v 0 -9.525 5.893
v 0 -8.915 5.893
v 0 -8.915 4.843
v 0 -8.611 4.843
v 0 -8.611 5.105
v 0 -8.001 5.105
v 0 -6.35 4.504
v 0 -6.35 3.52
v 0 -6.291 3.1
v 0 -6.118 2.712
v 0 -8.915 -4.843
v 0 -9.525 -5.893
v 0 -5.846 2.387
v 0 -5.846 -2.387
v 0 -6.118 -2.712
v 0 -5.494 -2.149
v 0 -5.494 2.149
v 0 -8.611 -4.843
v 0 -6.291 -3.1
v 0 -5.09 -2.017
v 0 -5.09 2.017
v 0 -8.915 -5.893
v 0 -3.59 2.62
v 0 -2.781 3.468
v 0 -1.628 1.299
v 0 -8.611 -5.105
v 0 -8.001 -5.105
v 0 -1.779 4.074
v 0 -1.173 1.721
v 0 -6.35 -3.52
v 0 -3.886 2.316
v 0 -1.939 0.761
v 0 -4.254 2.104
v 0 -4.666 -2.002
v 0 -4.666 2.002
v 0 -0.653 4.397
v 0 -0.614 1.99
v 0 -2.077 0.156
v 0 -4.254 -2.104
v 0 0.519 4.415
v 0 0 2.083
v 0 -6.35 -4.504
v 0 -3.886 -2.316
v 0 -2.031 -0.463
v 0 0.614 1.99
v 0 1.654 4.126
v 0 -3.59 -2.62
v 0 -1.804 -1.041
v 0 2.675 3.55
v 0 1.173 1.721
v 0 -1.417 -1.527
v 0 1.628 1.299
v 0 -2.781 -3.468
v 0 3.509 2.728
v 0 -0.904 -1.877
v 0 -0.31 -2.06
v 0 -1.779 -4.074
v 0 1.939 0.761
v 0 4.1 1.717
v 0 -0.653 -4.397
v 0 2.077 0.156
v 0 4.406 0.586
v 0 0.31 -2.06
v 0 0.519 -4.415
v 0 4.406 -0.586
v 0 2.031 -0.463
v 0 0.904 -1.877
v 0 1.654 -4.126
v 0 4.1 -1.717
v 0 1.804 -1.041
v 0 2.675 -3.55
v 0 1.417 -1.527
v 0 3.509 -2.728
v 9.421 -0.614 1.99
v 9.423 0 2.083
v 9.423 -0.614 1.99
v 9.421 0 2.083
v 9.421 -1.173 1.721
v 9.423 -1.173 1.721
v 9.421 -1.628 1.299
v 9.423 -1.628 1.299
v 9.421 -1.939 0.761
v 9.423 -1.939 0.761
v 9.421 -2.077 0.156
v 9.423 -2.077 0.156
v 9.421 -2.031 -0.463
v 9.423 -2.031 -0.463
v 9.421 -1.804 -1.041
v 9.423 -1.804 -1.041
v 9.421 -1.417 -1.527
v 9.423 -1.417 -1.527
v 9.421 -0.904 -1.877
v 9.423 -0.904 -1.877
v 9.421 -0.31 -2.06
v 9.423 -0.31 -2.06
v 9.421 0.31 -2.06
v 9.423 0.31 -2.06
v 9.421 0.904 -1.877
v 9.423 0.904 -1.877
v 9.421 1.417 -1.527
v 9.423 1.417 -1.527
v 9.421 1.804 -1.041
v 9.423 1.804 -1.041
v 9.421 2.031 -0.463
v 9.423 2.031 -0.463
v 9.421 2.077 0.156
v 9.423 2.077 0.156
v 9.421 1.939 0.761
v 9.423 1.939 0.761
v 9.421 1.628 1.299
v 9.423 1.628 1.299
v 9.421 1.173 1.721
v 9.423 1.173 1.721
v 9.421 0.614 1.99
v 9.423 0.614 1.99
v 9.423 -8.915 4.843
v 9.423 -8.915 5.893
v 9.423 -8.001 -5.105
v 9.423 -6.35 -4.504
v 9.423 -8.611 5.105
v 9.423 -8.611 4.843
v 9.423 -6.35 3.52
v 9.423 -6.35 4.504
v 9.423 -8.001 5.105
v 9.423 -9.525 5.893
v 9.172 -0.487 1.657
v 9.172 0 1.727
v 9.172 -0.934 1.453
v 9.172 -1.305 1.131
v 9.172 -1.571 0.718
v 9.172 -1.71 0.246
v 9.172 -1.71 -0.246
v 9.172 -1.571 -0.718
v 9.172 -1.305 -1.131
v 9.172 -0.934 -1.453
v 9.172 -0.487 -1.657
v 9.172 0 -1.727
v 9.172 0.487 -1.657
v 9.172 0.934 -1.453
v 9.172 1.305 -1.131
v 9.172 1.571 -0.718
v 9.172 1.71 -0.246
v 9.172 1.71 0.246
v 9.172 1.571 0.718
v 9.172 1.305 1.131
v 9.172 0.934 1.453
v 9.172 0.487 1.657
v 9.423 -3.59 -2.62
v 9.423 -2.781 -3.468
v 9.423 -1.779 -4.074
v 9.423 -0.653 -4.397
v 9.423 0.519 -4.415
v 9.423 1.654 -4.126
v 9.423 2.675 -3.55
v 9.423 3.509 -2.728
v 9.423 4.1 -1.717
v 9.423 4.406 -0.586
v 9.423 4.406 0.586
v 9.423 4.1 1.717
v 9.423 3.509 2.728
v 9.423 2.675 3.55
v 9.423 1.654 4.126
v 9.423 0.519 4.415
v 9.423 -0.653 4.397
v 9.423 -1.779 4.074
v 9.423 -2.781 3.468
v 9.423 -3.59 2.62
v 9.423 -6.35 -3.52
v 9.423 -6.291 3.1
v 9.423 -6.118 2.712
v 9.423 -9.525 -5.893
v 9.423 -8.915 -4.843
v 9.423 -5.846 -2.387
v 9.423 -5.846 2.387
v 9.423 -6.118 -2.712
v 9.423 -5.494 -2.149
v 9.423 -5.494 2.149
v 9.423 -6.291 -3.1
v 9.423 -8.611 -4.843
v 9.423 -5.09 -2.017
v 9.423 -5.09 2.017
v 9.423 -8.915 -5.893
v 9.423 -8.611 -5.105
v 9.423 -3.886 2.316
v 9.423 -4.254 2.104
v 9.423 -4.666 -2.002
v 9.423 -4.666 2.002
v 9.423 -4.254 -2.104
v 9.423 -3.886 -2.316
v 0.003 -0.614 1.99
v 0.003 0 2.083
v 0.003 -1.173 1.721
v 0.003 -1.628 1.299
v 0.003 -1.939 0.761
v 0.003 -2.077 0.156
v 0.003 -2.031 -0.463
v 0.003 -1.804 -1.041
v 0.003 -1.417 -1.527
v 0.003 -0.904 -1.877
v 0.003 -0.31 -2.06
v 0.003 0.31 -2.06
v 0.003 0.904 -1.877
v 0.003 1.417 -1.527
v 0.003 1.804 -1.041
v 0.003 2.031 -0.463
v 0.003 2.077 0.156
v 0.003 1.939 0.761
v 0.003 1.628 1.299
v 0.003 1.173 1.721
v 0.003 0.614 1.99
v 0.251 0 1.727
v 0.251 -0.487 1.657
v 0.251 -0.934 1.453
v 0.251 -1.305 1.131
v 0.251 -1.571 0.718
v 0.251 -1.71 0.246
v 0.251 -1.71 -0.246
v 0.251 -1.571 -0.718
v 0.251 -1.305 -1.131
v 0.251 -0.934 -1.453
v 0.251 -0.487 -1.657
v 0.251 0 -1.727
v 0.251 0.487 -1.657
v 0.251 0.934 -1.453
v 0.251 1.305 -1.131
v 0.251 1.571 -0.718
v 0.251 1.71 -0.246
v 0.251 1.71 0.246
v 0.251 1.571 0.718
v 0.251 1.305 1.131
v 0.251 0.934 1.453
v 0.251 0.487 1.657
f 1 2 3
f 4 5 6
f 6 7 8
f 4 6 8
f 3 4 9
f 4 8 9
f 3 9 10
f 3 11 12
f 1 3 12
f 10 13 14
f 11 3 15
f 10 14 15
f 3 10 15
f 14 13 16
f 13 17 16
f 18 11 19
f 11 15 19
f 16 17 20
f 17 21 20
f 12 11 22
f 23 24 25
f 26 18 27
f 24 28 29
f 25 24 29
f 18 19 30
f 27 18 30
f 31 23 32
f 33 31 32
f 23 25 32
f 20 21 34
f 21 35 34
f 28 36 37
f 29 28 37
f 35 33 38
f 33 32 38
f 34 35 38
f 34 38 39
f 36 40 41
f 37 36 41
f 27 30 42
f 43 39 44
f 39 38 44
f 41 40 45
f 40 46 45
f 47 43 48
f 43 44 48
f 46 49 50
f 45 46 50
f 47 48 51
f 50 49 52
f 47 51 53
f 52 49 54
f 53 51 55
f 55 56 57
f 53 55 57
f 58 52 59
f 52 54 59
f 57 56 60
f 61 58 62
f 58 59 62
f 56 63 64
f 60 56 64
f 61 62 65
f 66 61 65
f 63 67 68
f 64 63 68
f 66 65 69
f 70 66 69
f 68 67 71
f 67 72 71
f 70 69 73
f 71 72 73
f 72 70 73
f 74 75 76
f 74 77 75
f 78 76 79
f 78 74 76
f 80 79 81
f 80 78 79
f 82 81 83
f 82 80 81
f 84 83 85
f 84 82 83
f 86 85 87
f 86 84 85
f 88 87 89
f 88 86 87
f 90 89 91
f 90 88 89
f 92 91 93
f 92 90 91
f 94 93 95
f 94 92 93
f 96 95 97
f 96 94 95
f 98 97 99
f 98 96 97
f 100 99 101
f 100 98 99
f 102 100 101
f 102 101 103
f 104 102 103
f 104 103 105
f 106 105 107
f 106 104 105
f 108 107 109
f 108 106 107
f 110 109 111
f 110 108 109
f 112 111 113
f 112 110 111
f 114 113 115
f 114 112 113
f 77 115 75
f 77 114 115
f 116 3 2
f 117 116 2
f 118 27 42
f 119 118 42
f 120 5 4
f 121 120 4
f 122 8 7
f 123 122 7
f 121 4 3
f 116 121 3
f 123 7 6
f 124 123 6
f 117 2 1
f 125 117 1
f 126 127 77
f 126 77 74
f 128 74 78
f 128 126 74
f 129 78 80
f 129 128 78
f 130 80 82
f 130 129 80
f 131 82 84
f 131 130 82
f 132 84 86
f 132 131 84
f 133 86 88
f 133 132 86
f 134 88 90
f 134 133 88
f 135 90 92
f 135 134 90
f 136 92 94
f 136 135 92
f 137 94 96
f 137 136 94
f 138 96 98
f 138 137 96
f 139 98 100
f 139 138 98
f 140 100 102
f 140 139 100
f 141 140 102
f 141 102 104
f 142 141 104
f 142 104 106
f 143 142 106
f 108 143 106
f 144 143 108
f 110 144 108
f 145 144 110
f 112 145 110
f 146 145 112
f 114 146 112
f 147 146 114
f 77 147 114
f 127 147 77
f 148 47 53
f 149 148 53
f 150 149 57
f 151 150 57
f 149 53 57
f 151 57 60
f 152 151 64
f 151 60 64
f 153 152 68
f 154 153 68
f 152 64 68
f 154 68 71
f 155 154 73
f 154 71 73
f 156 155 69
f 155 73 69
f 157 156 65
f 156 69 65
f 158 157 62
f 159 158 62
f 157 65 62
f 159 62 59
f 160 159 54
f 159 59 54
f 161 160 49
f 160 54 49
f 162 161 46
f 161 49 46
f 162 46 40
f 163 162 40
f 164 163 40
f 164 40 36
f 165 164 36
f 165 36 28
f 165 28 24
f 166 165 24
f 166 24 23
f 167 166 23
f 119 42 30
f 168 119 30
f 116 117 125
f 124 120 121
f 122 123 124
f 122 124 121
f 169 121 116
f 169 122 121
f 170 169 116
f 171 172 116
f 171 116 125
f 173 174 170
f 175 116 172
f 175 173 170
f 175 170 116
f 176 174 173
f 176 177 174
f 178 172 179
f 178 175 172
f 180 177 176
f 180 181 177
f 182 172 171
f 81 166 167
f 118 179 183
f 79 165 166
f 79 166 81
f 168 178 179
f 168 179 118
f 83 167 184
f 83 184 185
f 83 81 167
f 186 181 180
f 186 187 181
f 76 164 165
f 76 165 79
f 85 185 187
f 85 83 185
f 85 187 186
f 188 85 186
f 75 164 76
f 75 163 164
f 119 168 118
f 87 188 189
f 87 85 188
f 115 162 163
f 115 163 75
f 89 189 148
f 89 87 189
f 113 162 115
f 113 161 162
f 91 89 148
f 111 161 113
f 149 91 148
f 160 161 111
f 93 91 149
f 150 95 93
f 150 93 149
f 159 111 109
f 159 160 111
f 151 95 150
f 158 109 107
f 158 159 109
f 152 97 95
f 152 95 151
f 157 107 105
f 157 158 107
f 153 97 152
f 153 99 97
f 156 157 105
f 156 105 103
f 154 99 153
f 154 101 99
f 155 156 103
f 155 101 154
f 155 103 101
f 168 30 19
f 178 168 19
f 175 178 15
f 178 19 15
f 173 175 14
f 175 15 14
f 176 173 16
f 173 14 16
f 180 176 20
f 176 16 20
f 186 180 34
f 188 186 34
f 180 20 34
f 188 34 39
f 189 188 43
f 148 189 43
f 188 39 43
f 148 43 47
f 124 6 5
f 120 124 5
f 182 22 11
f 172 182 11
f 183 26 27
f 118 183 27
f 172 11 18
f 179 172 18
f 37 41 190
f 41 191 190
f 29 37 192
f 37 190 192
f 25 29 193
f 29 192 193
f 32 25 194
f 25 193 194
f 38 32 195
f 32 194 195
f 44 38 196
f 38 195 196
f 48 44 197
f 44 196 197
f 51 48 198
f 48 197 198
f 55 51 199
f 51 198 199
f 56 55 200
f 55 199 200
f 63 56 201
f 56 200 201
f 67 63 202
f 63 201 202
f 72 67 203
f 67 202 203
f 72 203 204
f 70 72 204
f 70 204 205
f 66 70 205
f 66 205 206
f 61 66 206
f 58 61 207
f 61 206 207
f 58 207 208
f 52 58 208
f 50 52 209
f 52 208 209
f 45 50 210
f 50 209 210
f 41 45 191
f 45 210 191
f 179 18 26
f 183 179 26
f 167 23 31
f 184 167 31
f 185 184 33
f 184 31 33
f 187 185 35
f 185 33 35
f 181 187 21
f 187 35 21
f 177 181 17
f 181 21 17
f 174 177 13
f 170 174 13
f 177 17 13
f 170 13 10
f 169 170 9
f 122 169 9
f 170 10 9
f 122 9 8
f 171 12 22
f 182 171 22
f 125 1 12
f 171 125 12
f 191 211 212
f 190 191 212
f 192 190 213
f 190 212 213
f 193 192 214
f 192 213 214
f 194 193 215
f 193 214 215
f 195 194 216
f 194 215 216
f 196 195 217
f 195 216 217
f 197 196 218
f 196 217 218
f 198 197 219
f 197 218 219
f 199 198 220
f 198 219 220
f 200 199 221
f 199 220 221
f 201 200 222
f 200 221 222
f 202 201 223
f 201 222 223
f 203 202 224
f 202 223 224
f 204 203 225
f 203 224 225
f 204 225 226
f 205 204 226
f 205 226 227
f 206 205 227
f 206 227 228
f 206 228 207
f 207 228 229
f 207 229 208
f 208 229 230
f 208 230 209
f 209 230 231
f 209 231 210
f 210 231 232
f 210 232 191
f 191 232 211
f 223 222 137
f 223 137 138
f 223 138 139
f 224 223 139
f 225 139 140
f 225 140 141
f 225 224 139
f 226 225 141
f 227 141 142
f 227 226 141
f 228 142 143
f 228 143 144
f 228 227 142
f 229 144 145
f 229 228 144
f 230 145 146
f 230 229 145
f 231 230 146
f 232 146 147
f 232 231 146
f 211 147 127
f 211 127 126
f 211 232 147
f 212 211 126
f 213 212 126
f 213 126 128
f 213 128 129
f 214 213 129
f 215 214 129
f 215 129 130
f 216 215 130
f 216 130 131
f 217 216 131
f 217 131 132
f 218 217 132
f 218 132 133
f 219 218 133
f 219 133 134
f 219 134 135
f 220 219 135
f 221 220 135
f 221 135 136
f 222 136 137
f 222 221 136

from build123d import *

# Parameters (mm, degrees)
BODYSKE_R  = 1.7272
BODY_DEPTH = 9.4234


with BuildPart() as part:
    # BodySke → Body (new body)
    with BuildSketch(Plane(origin=(0, 0, 0), x_dir=(0, 0, -1), z_dir=(1, 0, 0))):
        with BuildLine():
            Line((-5.8928, -9.525), (5.8928, -9.525))
            Line((5.8928, -9.525), (5.8928, -8.9154))
            Line((5.8928, -8.9154), (4.842933333, -8.9154))
            Line((4.842933333, -8.9154), (4.842933333, -8.6106))
            Line((4.842933333, -8.6106), (5.1054, -8.6106))
            Line((5.1054, -8.6106), (5.1054, -8.001))
            Line((5.1054, -8.001), (4.504485143, -6.35))
            Line((4.504485143, -6.35), (3.520438226, -6.35))
            ThreePointArc((3.520438226, -6.35), (2.069125842, -5.296760115), (2.620488612, -3.59041285))
            ThreePointArc((2.620488612, -3.59041285), (0, 4.445), (-2.620488612, -3.59041285))
            ThreePointArc((-2.620488612, -3.59041285), (-2.069125842, -5.296760115), (-3.520438226, -6.35))
            Line((-3.520438226, -6.35), (-4.504485143, -6.35))
            Line((-4.504485143, -6.35), (-5.1054, -8.001))
            Line((-5.1054, -8.001), (-5.1054, -8.6106))
            Line((-5.1054, -8.6106), (-4.842933333, -8.6106))
            Line((-4.842933333, -8.6106), (-4.842933333, -8.9154))
            Line((-4.842933333, -8.9154), (-5.8928, -8.9154))
            Line((-5.8928, -8.9154), (-5.8928, -9.525))
        make_face()
        Circle(BODYSKE_R, mode=Mode.SUBTRACT)
    extrude(amount=BODY_DEPTH)

    # EndChamferSke → EndChamfer (revolve, cut)
    with BuildSketch(Plane.XY, mode=Mode.PRIVATE) as endchamfer_sk:
        Polygon((-0.254, 2.0828), (0.00254, 2.0828), (0.251441319, 1.7272), (-0.254, 1.7272), align=None)
        Polygon((9.6774, 2.0828), (9.42086, 2.0828), (9.171958681, 1.7272), (9.6774, 1.7272), align=None)
    revolve(endchamfer_sk.sketch.rotate(Axis((-5.105879624, 0, 0), (1, 0, 0)), 90), axis=Axis((-5.105879624, 0, 0), (1, 0, 0)), mode=Mode.SUBTRACT)


solid = part.part
